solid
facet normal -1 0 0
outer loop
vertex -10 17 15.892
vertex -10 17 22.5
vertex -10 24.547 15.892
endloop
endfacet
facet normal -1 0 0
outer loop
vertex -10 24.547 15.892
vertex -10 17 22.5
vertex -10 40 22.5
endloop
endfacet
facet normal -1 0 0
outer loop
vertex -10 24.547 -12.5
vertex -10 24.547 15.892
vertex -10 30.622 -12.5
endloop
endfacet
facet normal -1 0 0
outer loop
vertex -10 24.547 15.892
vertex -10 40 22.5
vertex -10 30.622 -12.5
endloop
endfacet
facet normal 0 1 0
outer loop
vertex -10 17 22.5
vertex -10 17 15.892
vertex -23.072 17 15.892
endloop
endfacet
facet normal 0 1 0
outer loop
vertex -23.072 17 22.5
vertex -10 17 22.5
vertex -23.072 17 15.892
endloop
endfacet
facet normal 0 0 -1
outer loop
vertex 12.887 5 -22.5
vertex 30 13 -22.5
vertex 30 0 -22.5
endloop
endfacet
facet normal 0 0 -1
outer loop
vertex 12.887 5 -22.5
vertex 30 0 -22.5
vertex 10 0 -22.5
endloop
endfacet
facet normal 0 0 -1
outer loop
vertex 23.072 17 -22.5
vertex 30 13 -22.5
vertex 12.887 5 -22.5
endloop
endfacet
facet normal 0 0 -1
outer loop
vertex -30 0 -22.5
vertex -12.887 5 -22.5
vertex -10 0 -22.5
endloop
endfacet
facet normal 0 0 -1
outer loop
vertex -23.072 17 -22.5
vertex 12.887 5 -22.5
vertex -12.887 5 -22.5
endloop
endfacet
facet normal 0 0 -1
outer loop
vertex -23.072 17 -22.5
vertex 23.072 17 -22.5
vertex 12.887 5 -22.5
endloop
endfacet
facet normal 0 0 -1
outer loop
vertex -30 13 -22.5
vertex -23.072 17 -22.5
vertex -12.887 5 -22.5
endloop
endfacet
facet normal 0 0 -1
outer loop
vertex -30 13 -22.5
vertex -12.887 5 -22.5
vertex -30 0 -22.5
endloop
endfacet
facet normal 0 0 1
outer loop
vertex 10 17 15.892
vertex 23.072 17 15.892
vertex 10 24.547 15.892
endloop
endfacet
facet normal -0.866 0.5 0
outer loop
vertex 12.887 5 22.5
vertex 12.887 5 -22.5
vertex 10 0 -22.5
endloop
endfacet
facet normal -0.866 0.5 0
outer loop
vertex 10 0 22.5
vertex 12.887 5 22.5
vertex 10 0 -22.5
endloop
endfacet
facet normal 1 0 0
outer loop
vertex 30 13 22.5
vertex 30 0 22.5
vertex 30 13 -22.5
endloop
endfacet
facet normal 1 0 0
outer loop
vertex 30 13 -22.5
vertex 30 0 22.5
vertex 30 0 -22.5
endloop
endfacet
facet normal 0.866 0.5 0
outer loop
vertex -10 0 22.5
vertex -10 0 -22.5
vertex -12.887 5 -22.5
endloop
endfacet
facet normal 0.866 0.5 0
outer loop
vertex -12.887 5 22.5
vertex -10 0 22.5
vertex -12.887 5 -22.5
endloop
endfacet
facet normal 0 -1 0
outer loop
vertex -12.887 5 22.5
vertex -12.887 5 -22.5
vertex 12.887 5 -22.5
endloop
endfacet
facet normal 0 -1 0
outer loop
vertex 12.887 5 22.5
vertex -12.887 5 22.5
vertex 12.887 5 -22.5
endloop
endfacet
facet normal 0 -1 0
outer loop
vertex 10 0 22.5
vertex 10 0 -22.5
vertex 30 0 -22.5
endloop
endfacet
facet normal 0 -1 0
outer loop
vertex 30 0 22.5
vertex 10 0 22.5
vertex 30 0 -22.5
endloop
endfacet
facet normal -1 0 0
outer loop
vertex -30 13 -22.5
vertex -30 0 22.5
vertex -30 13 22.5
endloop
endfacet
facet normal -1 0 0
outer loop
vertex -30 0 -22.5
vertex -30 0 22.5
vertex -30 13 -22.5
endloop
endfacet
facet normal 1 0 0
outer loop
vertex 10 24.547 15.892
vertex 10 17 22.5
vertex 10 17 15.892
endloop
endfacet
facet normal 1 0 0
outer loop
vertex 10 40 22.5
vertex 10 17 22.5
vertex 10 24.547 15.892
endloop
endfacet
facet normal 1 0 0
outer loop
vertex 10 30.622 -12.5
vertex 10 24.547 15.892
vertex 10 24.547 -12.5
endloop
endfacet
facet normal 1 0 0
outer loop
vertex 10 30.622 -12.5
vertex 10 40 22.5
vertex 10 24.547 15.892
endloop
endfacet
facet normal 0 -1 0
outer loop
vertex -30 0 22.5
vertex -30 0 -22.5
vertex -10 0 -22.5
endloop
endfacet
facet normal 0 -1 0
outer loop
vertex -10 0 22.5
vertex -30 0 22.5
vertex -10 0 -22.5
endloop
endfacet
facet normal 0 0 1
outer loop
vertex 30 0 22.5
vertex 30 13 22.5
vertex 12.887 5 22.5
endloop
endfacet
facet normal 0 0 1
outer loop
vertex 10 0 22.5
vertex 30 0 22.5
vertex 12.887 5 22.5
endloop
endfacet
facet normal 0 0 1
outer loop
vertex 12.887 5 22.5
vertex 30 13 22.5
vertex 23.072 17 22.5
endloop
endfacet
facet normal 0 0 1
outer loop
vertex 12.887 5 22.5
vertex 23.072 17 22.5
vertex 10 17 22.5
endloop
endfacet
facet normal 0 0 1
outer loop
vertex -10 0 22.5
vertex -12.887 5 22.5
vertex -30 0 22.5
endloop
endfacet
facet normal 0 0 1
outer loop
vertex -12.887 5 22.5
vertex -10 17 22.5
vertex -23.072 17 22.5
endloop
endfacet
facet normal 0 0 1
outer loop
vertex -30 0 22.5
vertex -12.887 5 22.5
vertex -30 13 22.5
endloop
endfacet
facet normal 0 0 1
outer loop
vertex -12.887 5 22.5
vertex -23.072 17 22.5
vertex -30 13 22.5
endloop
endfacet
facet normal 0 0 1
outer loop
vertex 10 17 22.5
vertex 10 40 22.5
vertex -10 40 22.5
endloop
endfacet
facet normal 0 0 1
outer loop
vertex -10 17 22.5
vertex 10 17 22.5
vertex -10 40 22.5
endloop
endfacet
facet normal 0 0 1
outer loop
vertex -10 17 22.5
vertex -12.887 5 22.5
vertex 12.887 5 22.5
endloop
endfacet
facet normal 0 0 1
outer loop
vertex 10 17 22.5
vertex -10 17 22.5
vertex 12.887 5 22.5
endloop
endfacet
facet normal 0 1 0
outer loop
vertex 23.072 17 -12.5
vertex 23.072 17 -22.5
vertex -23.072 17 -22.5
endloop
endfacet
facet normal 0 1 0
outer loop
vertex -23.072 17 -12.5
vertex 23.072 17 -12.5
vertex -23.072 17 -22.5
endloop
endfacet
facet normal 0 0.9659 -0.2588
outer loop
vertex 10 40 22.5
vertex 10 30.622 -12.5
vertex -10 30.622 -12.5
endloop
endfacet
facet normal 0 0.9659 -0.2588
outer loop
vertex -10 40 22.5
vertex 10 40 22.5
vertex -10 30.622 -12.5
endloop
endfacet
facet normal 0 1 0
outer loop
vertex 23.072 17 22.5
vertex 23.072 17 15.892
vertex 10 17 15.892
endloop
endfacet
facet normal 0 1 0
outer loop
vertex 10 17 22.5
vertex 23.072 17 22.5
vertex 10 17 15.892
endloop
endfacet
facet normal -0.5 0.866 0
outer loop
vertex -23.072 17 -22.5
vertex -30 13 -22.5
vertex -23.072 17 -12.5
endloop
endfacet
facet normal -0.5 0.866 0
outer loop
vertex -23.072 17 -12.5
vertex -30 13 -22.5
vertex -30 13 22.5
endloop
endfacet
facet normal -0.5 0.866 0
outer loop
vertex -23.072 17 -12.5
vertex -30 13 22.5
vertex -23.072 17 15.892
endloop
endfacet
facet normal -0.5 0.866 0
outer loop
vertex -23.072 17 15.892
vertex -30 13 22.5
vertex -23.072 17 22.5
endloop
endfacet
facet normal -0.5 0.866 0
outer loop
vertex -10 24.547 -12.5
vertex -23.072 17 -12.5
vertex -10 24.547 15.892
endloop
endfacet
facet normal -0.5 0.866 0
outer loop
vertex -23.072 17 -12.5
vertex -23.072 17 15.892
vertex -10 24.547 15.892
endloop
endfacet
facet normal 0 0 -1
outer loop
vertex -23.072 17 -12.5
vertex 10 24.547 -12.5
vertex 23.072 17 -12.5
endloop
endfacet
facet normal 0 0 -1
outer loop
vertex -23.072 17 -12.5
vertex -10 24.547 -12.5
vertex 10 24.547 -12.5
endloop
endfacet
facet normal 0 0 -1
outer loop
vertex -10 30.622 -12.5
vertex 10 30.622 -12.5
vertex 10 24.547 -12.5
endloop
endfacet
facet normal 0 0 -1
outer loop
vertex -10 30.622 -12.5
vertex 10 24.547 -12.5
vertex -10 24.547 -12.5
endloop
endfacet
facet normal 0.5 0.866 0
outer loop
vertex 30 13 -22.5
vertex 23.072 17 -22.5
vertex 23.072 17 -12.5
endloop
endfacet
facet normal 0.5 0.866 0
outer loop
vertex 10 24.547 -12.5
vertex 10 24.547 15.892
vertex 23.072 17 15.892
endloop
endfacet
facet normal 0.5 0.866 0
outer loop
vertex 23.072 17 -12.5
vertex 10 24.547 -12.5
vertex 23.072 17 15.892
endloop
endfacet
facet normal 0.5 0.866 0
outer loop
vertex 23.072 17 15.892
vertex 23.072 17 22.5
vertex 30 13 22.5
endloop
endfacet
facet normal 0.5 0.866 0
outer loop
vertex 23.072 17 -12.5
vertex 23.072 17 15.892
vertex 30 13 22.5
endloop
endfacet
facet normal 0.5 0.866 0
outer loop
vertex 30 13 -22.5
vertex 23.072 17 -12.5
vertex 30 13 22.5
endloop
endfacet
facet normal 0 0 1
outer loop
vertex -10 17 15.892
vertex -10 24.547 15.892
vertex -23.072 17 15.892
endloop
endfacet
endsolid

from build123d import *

# Parameters (mm, degrees)
SKETCH2_W           = 60
SKETCH2_H           = 45
BOSS_EXTRUDE1_DEPTH = 13
BOSS_EXTRUDE2_DEPTH = 45
SKETCH11_W          = 60
SKETCH11_H          = 10
SKETCH11_H_2        = 6.608108108
CUT_EXTRUDE2_DEPTH  = 21
BOSS_EXTRUDE3_REACH = 42
SKETCH12_W          = 20
SKETCH12_H          = 35
DRAFT1_ANGLE        = -15
CUT_EXTRUDE3_DEPTH  = 46


with BuildPart() as part:
    # Sketch2 → Boss-Extrude1 (new body)
    with BuildSketch(Plane(origin=(0, 0, 0), x_dir=(1, 0, 0), z_dir=(0, 1, 0))):
        Rectangle(SKETCH2_W, SKETCH2_H)
    extrude(amount=BOSS_EXTRUDE1_DEPTH)

    # Sketch3 → Boss-Extrude2 (add)
    with BuildSketch(Plane.XY.offset(22.5)):
        Polygon((0, 30.320508076), (30, 13), (-30, 13), align=None)
    extrude(amount=-BOSS_EXTRUDE2_DEPTH)

    # Sketch11 → Cut-Extrude2 (cut)
    with BuildSketch(Plane(origin=(0, 38, 0), x_dir=(-1, 0, 0), z_dir=(0, -1, 0))):
        with Locations((0, 17.5)):
            Rectangle(SKETCH11_W, SKETCH11_H)
        with Locations((0, -19.195945946)):
            Rectangle(SKETCH11_W, SKETCH11_H_2)
    extrude(amount=CUT_EXTRUDE2_DEPTH, mode=Mode.SUBTRACT)

    # Sketch12 → Boss-Extrude3 (add, up to next)
    with BuildSketch(Plane(origin=(0, 40, 0), x_dir=(-1, 0, 0), z_dir=(0, -1, 0)), mode=Mode.PRIVATE) as boss_extrude3_sk1:
        with Locations((0, -5)):
            Rectangle(SKETCH12_W, SKETCH12_H)
    boss_extrude3_tool1 = extrude(boss_extrude3_sk1.sketch, amount=BOSS_EXTRUDE3_REACH, mode=Mode.PRIVATE) - part.part
    add(boss_extrude3_tool1.solids().sort_by_distance((0, 40, 5))[0])

    # Draft1
    draft1_faces = [part.faces().sort_by_distance(p)[0] for p in [
        (0, 40, 5),
    ]]
    draft(draft1_faces, Plane(origin=(30, 13, 22.5), x_dir=(1, 0, 0), z_dir=(0, 0, 1)), DRAFT1_ANGLE)

    # Sketch16 → Cut-Extrude3 (cut, through all)
    with BuildSketch(Plane(origin=(0, 0, -22.5), x_dir=(-1, 0, 0), z_dir=(0, 0, -1))):
        Polygon((-12.886751346, 5), (-10, 0), (10, 0), (12.886751346, 5), align=None)
    extrude(amount=-CUT_EXTRUDE3_DEPTH, mode=Mode.SUBTRACT)


solid = part.part
